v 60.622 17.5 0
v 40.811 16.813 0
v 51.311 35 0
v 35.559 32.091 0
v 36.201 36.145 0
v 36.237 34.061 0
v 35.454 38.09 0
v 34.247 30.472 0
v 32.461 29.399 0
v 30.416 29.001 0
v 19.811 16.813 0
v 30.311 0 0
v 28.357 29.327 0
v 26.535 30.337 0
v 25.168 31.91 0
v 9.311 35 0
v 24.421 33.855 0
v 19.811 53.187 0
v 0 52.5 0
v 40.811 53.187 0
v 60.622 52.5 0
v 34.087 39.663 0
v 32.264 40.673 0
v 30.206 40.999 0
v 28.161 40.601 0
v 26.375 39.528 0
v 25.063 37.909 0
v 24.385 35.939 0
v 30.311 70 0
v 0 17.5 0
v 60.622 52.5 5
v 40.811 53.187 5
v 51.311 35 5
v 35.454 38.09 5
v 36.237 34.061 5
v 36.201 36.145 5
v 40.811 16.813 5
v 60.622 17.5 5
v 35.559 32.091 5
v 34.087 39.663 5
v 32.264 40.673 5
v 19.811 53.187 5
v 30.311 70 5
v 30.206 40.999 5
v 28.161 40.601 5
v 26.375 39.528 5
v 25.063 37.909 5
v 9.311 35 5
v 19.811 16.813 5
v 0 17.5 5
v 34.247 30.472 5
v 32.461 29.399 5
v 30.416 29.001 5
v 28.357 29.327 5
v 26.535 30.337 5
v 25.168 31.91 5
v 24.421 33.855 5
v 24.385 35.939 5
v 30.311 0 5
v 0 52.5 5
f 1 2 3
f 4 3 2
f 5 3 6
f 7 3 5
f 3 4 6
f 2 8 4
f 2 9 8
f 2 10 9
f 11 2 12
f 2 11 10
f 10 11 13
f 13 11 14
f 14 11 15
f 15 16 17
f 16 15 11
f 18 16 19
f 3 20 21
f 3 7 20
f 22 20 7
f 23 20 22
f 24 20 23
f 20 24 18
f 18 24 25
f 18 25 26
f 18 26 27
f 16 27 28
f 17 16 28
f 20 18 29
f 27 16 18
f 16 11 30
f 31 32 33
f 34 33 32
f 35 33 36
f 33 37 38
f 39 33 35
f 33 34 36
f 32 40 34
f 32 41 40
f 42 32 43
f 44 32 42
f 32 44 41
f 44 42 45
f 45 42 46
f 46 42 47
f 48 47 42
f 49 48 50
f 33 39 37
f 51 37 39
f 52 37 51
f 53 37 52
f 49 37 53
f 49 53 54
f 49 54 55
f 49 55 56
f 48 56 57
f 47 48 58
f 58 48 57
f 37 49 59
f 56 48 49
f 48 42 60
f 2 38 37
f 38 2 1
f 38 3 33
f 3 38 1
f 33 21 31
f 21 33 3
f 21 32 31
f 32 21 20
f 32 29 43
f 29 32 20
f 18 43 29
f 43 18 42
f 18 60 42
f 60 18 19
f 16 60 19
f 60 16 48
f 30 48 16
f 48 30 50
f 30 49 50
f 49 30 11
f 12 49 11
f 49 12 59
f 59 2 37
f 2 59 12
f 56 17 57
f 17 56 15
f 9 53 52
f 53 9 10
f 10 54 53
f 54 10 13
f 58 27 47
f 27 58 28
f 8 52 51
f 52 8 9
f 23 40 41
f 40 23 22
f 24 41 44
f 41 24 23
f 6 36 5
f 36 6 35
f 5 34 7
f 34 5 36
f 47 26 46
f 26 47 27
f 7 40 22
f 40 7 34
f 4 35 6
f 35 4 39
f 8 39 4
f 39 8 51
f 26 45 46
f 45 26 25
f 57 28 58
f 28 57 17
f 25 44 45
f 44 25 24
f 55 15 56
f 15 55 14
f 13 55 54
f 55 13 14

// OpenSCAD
$fn = 32;

// ----------------------------------------------------------------------
// Star wheel: 6-point blunt, R35
// ----------------------------------------------------------------------

// --- parameters (mm) ---
n_points = 6;             // number of points / teeth
r_out = 35;               // tip radius
r_in = 21;                // root radius
bore_r = 6;               // centre bore radius
plate_t = 5;              // plate thickness, Z (extrusion height)
bore_d = 12;              // centre bore diameter

profile = [[30.311, 70], [19.811, 53.187], [0, 52.5], [9.311, 35], [0, 17.5], [19.811, 16.813], [30.311, 0], [40.811, 16.813], [60.622, 17.5], [51.311, 35], [60.622, 52.5], [40.811, 53.187]];  // primary outline, 12 points, counter clockwise
void_1 = [[36.201, 36.145], [35.454, 38.09], [34.087, 39.663], [32.264, 40.673], [30.206, 40.999], [28.161, 40.601], [26.375, 39.528], [25.063, 37.909], [24.385, 35.939], [24.421, 33.855], [25.168, 31.91], [26.535, 30.337], [28.357, 29.327], [30.416, 29.001], [32.461, 29.399], [34.247, 30.472], [35.559, 32.091], [36.237, 34.061]];  // centre bore, 18 points

// --- the one profile operation ---
difference() {
  linear_extrude(height = plate_t) polygon(points = profile);
  translate([0, 0, -1])
    linear_extrude(height = plate_t + 2) polygon(points = void_1);
}
